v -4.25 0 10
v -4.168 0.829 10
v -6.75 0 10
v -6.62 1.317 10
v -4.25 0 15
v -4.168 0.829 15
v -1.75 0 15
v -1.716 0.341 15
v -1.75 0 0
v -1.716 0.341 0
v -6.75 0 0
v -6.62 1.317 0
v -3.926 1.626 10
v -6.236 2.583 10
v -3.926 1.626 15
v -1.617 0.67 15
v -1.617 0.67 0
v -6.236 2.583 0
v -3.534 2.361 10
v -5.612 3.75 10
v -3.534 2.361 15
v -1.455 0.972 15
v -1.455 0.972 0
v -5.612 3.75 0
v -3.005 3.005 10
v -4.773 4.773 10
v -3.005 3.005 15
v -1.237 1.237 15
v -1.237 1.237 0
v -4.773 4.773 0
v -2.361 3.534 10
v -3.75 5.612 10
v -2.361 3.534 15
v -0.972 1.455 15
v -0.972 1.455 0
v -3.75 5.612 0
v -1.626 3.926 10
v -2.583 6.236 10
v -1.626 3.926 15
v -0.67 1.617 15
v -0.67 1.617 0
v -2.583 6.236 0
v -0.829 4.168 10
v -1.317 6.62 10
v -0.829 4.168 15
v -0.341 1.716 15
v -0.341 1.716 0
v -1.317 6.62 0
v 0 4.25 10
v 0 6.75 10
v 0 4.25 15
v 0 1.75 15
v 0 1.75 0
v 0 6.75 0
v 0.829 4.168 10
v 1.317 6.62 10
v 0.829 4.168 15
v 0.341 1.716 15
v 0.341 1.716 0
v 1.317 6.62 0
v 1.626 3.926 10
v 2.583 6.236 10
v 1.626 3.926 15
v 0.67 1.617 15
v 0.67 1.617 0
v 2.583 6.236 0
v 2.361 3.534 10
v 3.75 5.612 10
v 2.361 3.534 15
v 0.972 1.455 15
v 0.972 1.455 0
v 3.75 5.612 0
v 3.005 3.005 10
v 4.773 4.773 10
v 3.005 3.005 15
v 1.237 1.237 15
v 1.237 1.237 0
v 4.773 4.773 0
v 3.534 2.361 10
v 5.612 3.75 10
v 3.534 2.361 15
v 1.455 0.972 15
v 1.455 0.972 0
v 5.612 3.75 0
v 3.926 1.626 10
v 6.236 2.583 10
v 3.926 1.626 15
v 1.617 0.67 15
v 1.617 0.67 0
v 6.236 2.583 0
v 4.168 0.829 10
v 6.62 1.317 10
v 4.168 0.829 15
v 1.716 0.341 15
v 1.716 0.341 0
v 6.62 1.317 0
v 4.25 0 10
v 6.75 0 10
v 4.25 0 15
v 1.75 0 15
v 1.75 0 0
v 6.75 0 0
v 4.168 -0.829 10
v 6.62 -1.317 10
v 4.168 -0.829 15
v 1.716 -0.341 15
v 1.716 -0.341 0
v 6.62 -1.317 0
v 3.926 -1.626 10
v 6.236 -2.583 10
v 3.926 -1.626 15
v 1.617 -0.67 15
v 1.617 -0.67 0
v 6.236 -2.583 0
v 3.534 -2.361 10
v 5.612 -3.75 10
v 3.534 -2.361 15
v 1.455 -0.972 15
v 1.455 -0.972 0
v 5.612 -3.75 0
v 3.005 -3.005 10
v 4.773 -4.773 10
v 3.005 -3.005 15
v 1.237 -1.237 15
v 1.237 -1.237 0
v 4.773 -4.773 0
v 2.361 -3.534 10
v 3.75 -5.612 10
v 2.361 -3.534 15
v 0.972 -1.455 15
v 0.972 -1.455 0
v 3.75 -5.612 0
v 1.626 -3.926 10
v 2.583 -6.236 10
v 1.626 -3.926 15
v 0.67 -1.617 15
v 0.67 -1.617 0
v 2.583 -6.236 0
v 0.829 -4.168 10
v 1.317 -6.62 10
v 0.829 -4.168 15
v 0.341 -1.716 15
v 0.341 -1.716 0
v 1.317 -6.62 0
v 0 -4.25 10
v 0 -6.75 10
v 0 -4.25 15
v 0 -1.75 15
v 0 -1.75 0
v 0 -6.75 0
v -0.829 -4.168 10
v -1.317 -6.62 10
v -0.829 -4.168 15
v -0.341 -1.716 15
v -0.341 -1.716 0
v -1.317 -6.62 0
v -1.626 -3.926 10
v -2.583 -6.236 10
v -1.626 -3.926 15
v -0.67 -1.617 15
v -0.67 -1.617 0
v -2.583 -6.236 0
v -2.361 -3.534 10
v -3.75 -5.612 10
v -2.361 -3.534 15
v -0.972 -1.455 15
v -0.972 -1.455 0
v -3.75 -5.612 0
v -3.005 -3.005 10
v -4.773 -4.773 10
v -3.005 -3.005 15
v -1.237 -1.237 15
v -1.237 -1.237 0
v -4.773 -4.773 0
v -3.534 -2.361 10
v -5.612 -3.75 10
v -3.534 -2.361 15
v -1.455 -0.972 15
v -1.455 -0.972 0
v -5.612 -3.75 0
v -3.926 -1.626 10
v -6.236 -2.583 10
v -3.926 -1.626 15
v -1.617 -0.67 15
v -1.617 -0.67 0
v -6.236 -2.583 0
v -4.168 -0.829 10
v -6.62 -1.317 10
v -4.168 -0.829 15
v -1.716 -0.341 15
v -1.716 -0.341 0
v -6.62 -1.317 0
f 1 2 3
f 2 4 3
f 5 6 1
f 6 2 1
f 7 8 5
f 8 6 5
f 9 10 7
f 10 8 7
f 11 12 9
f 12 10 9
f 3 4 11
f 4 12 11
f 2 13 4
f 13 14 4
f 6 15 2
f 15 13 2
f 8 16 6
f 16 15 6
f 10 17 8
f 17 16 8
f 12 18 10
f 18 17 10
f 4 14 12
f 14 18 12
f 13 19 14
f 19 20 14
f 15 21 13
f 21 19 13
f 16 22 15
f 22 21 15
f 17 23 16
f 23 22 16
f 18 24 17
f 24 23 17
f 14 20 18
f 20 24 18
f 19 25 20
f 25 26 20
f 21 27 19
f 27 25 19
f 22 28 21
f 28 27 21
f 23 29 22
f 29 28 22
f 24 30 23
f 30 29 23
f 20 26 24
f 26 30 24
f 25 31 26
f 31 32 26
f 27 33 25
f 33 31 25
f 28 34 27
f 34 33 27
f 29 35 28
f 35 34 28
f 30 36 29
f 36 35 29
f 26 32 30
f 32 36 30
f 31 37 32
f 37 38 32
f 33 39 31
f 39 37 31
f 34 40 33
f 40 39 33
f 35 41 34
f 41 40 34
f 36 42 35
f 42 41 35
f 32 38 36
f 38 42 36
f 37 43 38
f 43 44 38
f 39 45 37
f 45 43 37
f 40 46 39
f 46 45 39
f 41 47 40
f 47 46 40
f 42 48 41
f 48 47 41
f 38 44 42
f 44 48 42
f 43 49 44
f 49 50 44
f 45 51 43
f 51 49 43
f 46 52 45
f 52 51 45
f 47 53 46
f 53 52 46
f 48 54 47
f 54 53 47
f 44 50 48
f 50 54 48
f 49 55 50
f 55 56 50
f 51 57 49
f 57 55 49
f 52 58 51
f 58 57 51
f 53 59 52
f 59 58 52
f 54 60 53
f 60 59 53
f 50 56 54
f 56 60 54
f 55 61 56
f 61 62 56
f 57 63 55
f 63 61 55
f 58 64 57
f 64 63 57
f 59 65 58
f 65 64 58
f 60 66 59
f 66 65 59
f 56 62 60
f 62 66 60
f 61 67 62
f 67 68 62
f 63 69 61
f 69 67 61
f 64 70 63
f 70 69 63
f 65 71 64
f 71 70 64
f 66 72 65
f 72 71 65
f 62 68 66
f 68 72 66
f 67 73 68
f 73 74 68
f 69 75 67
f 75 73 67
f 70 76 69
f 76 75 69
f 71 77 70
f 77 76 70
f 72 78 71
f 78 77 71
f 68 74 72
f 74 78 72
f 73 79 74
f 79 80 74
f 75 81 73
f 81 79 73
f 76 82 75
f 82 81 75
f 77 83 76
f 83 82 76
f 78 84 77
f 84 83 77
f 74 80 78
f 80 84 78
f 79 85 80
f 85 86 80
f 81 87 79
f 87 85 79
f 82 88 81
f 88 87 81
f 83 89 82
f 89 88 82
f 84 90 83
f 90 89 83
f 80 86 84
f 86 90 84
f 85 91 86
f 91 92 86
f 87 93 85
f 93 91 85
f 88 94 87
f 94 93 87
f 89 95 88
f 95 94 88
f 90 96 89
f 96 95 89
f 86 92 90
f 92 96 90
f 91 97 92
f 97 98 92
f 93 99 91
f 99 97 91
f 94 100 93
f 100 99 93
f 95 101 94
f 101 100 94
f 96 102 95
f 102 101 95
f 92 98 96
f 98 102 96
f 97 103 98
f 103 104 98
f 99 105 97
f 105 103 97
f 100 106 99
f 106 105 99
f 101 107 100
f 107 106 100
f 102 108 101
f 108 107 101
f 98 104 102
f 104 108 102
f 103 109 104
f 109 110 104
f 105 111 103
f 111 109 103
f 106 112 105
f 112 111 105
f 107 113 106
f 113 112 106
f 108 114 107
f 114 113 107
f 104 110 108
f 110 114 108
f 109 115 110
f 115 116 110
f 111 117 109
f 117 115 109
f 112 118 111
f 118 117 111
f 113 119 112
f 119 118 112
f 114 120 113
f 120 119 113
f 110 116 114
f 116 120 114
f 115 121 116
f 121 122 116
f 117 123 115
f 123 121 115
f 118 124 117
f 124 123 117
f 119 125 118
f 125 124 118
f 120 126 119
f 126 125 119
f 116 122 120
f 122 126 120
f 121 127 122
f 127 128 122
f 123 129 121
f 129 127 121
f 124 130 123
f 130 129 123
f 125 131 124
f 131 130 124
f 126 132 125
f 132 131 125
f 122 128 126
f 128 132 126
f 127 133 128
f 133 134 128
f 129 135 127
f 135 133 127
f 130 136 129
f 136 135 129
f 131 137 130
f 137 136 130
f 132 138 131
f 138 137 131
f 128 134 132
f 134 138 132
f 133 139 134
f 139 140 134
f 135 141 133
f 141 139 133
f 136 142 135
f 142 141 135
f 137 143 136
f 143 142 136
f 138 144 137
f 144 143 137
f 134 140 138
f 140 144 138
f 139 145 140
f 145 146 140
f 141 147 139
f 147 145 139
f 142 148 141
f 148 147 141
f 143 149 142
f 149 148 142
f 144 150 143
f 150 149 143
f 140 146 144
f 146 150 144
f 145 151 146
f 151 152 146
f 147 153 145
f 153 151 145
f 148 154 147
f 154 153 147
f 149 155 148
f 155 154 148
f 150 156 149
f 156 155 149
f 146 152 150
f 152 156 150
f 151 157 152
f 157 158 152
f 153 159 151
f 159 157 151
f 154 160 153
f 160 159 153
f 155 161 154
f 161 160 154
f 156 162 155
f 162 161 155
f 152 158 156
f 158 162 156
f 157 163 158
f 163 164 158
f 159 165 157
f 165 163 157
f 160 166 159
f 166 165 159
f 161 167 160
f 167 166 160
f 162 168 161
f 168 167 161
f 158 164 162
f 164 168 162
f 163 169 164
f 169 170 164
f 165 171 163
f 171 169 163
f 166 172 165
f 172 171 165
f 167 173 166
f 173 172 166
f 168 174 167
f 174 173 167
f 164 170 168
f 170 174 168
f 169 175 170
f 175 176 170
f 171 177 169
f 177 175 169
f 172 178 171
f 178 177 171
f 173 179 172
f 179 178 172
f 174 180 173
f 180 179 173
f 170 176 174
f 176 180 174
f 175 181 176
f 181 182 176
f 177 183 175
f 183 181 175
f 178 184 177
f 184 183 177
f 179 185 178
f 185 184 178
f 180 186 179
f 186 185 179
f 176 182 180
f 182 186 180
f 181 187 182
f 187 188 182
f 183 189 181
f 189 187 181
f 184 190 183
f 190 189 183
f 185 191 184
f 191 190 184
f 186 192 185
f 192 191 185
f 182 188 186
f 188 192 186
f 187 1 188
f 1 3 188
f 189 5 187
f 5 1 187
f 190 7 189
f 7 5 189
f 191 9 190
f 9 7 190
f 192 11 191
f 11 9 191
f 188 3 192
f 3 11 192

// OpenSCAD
$fn = 32;

// ----------------------------------------------------------------------
// Form washer: stepped_c washer, 13.5 mm outside, 3.5 mm bore
// ----------------------------------------------------------------------

// --- parameters (mm) ---
revolve_angle = 360;      // full turn around the Z axis
profile_points = 6;       // points of the closed outline

profile = [[1.75, 0], [6.75, 0], [6.75, 10], [4.25, 10], [4.25, 15], [1.75, 15]];  // single closed polygon, 6 points, counter clockwise

// --- the one profile operation ---
rotate_extrude(angle = revolve_angle) polygon(points = profile);
